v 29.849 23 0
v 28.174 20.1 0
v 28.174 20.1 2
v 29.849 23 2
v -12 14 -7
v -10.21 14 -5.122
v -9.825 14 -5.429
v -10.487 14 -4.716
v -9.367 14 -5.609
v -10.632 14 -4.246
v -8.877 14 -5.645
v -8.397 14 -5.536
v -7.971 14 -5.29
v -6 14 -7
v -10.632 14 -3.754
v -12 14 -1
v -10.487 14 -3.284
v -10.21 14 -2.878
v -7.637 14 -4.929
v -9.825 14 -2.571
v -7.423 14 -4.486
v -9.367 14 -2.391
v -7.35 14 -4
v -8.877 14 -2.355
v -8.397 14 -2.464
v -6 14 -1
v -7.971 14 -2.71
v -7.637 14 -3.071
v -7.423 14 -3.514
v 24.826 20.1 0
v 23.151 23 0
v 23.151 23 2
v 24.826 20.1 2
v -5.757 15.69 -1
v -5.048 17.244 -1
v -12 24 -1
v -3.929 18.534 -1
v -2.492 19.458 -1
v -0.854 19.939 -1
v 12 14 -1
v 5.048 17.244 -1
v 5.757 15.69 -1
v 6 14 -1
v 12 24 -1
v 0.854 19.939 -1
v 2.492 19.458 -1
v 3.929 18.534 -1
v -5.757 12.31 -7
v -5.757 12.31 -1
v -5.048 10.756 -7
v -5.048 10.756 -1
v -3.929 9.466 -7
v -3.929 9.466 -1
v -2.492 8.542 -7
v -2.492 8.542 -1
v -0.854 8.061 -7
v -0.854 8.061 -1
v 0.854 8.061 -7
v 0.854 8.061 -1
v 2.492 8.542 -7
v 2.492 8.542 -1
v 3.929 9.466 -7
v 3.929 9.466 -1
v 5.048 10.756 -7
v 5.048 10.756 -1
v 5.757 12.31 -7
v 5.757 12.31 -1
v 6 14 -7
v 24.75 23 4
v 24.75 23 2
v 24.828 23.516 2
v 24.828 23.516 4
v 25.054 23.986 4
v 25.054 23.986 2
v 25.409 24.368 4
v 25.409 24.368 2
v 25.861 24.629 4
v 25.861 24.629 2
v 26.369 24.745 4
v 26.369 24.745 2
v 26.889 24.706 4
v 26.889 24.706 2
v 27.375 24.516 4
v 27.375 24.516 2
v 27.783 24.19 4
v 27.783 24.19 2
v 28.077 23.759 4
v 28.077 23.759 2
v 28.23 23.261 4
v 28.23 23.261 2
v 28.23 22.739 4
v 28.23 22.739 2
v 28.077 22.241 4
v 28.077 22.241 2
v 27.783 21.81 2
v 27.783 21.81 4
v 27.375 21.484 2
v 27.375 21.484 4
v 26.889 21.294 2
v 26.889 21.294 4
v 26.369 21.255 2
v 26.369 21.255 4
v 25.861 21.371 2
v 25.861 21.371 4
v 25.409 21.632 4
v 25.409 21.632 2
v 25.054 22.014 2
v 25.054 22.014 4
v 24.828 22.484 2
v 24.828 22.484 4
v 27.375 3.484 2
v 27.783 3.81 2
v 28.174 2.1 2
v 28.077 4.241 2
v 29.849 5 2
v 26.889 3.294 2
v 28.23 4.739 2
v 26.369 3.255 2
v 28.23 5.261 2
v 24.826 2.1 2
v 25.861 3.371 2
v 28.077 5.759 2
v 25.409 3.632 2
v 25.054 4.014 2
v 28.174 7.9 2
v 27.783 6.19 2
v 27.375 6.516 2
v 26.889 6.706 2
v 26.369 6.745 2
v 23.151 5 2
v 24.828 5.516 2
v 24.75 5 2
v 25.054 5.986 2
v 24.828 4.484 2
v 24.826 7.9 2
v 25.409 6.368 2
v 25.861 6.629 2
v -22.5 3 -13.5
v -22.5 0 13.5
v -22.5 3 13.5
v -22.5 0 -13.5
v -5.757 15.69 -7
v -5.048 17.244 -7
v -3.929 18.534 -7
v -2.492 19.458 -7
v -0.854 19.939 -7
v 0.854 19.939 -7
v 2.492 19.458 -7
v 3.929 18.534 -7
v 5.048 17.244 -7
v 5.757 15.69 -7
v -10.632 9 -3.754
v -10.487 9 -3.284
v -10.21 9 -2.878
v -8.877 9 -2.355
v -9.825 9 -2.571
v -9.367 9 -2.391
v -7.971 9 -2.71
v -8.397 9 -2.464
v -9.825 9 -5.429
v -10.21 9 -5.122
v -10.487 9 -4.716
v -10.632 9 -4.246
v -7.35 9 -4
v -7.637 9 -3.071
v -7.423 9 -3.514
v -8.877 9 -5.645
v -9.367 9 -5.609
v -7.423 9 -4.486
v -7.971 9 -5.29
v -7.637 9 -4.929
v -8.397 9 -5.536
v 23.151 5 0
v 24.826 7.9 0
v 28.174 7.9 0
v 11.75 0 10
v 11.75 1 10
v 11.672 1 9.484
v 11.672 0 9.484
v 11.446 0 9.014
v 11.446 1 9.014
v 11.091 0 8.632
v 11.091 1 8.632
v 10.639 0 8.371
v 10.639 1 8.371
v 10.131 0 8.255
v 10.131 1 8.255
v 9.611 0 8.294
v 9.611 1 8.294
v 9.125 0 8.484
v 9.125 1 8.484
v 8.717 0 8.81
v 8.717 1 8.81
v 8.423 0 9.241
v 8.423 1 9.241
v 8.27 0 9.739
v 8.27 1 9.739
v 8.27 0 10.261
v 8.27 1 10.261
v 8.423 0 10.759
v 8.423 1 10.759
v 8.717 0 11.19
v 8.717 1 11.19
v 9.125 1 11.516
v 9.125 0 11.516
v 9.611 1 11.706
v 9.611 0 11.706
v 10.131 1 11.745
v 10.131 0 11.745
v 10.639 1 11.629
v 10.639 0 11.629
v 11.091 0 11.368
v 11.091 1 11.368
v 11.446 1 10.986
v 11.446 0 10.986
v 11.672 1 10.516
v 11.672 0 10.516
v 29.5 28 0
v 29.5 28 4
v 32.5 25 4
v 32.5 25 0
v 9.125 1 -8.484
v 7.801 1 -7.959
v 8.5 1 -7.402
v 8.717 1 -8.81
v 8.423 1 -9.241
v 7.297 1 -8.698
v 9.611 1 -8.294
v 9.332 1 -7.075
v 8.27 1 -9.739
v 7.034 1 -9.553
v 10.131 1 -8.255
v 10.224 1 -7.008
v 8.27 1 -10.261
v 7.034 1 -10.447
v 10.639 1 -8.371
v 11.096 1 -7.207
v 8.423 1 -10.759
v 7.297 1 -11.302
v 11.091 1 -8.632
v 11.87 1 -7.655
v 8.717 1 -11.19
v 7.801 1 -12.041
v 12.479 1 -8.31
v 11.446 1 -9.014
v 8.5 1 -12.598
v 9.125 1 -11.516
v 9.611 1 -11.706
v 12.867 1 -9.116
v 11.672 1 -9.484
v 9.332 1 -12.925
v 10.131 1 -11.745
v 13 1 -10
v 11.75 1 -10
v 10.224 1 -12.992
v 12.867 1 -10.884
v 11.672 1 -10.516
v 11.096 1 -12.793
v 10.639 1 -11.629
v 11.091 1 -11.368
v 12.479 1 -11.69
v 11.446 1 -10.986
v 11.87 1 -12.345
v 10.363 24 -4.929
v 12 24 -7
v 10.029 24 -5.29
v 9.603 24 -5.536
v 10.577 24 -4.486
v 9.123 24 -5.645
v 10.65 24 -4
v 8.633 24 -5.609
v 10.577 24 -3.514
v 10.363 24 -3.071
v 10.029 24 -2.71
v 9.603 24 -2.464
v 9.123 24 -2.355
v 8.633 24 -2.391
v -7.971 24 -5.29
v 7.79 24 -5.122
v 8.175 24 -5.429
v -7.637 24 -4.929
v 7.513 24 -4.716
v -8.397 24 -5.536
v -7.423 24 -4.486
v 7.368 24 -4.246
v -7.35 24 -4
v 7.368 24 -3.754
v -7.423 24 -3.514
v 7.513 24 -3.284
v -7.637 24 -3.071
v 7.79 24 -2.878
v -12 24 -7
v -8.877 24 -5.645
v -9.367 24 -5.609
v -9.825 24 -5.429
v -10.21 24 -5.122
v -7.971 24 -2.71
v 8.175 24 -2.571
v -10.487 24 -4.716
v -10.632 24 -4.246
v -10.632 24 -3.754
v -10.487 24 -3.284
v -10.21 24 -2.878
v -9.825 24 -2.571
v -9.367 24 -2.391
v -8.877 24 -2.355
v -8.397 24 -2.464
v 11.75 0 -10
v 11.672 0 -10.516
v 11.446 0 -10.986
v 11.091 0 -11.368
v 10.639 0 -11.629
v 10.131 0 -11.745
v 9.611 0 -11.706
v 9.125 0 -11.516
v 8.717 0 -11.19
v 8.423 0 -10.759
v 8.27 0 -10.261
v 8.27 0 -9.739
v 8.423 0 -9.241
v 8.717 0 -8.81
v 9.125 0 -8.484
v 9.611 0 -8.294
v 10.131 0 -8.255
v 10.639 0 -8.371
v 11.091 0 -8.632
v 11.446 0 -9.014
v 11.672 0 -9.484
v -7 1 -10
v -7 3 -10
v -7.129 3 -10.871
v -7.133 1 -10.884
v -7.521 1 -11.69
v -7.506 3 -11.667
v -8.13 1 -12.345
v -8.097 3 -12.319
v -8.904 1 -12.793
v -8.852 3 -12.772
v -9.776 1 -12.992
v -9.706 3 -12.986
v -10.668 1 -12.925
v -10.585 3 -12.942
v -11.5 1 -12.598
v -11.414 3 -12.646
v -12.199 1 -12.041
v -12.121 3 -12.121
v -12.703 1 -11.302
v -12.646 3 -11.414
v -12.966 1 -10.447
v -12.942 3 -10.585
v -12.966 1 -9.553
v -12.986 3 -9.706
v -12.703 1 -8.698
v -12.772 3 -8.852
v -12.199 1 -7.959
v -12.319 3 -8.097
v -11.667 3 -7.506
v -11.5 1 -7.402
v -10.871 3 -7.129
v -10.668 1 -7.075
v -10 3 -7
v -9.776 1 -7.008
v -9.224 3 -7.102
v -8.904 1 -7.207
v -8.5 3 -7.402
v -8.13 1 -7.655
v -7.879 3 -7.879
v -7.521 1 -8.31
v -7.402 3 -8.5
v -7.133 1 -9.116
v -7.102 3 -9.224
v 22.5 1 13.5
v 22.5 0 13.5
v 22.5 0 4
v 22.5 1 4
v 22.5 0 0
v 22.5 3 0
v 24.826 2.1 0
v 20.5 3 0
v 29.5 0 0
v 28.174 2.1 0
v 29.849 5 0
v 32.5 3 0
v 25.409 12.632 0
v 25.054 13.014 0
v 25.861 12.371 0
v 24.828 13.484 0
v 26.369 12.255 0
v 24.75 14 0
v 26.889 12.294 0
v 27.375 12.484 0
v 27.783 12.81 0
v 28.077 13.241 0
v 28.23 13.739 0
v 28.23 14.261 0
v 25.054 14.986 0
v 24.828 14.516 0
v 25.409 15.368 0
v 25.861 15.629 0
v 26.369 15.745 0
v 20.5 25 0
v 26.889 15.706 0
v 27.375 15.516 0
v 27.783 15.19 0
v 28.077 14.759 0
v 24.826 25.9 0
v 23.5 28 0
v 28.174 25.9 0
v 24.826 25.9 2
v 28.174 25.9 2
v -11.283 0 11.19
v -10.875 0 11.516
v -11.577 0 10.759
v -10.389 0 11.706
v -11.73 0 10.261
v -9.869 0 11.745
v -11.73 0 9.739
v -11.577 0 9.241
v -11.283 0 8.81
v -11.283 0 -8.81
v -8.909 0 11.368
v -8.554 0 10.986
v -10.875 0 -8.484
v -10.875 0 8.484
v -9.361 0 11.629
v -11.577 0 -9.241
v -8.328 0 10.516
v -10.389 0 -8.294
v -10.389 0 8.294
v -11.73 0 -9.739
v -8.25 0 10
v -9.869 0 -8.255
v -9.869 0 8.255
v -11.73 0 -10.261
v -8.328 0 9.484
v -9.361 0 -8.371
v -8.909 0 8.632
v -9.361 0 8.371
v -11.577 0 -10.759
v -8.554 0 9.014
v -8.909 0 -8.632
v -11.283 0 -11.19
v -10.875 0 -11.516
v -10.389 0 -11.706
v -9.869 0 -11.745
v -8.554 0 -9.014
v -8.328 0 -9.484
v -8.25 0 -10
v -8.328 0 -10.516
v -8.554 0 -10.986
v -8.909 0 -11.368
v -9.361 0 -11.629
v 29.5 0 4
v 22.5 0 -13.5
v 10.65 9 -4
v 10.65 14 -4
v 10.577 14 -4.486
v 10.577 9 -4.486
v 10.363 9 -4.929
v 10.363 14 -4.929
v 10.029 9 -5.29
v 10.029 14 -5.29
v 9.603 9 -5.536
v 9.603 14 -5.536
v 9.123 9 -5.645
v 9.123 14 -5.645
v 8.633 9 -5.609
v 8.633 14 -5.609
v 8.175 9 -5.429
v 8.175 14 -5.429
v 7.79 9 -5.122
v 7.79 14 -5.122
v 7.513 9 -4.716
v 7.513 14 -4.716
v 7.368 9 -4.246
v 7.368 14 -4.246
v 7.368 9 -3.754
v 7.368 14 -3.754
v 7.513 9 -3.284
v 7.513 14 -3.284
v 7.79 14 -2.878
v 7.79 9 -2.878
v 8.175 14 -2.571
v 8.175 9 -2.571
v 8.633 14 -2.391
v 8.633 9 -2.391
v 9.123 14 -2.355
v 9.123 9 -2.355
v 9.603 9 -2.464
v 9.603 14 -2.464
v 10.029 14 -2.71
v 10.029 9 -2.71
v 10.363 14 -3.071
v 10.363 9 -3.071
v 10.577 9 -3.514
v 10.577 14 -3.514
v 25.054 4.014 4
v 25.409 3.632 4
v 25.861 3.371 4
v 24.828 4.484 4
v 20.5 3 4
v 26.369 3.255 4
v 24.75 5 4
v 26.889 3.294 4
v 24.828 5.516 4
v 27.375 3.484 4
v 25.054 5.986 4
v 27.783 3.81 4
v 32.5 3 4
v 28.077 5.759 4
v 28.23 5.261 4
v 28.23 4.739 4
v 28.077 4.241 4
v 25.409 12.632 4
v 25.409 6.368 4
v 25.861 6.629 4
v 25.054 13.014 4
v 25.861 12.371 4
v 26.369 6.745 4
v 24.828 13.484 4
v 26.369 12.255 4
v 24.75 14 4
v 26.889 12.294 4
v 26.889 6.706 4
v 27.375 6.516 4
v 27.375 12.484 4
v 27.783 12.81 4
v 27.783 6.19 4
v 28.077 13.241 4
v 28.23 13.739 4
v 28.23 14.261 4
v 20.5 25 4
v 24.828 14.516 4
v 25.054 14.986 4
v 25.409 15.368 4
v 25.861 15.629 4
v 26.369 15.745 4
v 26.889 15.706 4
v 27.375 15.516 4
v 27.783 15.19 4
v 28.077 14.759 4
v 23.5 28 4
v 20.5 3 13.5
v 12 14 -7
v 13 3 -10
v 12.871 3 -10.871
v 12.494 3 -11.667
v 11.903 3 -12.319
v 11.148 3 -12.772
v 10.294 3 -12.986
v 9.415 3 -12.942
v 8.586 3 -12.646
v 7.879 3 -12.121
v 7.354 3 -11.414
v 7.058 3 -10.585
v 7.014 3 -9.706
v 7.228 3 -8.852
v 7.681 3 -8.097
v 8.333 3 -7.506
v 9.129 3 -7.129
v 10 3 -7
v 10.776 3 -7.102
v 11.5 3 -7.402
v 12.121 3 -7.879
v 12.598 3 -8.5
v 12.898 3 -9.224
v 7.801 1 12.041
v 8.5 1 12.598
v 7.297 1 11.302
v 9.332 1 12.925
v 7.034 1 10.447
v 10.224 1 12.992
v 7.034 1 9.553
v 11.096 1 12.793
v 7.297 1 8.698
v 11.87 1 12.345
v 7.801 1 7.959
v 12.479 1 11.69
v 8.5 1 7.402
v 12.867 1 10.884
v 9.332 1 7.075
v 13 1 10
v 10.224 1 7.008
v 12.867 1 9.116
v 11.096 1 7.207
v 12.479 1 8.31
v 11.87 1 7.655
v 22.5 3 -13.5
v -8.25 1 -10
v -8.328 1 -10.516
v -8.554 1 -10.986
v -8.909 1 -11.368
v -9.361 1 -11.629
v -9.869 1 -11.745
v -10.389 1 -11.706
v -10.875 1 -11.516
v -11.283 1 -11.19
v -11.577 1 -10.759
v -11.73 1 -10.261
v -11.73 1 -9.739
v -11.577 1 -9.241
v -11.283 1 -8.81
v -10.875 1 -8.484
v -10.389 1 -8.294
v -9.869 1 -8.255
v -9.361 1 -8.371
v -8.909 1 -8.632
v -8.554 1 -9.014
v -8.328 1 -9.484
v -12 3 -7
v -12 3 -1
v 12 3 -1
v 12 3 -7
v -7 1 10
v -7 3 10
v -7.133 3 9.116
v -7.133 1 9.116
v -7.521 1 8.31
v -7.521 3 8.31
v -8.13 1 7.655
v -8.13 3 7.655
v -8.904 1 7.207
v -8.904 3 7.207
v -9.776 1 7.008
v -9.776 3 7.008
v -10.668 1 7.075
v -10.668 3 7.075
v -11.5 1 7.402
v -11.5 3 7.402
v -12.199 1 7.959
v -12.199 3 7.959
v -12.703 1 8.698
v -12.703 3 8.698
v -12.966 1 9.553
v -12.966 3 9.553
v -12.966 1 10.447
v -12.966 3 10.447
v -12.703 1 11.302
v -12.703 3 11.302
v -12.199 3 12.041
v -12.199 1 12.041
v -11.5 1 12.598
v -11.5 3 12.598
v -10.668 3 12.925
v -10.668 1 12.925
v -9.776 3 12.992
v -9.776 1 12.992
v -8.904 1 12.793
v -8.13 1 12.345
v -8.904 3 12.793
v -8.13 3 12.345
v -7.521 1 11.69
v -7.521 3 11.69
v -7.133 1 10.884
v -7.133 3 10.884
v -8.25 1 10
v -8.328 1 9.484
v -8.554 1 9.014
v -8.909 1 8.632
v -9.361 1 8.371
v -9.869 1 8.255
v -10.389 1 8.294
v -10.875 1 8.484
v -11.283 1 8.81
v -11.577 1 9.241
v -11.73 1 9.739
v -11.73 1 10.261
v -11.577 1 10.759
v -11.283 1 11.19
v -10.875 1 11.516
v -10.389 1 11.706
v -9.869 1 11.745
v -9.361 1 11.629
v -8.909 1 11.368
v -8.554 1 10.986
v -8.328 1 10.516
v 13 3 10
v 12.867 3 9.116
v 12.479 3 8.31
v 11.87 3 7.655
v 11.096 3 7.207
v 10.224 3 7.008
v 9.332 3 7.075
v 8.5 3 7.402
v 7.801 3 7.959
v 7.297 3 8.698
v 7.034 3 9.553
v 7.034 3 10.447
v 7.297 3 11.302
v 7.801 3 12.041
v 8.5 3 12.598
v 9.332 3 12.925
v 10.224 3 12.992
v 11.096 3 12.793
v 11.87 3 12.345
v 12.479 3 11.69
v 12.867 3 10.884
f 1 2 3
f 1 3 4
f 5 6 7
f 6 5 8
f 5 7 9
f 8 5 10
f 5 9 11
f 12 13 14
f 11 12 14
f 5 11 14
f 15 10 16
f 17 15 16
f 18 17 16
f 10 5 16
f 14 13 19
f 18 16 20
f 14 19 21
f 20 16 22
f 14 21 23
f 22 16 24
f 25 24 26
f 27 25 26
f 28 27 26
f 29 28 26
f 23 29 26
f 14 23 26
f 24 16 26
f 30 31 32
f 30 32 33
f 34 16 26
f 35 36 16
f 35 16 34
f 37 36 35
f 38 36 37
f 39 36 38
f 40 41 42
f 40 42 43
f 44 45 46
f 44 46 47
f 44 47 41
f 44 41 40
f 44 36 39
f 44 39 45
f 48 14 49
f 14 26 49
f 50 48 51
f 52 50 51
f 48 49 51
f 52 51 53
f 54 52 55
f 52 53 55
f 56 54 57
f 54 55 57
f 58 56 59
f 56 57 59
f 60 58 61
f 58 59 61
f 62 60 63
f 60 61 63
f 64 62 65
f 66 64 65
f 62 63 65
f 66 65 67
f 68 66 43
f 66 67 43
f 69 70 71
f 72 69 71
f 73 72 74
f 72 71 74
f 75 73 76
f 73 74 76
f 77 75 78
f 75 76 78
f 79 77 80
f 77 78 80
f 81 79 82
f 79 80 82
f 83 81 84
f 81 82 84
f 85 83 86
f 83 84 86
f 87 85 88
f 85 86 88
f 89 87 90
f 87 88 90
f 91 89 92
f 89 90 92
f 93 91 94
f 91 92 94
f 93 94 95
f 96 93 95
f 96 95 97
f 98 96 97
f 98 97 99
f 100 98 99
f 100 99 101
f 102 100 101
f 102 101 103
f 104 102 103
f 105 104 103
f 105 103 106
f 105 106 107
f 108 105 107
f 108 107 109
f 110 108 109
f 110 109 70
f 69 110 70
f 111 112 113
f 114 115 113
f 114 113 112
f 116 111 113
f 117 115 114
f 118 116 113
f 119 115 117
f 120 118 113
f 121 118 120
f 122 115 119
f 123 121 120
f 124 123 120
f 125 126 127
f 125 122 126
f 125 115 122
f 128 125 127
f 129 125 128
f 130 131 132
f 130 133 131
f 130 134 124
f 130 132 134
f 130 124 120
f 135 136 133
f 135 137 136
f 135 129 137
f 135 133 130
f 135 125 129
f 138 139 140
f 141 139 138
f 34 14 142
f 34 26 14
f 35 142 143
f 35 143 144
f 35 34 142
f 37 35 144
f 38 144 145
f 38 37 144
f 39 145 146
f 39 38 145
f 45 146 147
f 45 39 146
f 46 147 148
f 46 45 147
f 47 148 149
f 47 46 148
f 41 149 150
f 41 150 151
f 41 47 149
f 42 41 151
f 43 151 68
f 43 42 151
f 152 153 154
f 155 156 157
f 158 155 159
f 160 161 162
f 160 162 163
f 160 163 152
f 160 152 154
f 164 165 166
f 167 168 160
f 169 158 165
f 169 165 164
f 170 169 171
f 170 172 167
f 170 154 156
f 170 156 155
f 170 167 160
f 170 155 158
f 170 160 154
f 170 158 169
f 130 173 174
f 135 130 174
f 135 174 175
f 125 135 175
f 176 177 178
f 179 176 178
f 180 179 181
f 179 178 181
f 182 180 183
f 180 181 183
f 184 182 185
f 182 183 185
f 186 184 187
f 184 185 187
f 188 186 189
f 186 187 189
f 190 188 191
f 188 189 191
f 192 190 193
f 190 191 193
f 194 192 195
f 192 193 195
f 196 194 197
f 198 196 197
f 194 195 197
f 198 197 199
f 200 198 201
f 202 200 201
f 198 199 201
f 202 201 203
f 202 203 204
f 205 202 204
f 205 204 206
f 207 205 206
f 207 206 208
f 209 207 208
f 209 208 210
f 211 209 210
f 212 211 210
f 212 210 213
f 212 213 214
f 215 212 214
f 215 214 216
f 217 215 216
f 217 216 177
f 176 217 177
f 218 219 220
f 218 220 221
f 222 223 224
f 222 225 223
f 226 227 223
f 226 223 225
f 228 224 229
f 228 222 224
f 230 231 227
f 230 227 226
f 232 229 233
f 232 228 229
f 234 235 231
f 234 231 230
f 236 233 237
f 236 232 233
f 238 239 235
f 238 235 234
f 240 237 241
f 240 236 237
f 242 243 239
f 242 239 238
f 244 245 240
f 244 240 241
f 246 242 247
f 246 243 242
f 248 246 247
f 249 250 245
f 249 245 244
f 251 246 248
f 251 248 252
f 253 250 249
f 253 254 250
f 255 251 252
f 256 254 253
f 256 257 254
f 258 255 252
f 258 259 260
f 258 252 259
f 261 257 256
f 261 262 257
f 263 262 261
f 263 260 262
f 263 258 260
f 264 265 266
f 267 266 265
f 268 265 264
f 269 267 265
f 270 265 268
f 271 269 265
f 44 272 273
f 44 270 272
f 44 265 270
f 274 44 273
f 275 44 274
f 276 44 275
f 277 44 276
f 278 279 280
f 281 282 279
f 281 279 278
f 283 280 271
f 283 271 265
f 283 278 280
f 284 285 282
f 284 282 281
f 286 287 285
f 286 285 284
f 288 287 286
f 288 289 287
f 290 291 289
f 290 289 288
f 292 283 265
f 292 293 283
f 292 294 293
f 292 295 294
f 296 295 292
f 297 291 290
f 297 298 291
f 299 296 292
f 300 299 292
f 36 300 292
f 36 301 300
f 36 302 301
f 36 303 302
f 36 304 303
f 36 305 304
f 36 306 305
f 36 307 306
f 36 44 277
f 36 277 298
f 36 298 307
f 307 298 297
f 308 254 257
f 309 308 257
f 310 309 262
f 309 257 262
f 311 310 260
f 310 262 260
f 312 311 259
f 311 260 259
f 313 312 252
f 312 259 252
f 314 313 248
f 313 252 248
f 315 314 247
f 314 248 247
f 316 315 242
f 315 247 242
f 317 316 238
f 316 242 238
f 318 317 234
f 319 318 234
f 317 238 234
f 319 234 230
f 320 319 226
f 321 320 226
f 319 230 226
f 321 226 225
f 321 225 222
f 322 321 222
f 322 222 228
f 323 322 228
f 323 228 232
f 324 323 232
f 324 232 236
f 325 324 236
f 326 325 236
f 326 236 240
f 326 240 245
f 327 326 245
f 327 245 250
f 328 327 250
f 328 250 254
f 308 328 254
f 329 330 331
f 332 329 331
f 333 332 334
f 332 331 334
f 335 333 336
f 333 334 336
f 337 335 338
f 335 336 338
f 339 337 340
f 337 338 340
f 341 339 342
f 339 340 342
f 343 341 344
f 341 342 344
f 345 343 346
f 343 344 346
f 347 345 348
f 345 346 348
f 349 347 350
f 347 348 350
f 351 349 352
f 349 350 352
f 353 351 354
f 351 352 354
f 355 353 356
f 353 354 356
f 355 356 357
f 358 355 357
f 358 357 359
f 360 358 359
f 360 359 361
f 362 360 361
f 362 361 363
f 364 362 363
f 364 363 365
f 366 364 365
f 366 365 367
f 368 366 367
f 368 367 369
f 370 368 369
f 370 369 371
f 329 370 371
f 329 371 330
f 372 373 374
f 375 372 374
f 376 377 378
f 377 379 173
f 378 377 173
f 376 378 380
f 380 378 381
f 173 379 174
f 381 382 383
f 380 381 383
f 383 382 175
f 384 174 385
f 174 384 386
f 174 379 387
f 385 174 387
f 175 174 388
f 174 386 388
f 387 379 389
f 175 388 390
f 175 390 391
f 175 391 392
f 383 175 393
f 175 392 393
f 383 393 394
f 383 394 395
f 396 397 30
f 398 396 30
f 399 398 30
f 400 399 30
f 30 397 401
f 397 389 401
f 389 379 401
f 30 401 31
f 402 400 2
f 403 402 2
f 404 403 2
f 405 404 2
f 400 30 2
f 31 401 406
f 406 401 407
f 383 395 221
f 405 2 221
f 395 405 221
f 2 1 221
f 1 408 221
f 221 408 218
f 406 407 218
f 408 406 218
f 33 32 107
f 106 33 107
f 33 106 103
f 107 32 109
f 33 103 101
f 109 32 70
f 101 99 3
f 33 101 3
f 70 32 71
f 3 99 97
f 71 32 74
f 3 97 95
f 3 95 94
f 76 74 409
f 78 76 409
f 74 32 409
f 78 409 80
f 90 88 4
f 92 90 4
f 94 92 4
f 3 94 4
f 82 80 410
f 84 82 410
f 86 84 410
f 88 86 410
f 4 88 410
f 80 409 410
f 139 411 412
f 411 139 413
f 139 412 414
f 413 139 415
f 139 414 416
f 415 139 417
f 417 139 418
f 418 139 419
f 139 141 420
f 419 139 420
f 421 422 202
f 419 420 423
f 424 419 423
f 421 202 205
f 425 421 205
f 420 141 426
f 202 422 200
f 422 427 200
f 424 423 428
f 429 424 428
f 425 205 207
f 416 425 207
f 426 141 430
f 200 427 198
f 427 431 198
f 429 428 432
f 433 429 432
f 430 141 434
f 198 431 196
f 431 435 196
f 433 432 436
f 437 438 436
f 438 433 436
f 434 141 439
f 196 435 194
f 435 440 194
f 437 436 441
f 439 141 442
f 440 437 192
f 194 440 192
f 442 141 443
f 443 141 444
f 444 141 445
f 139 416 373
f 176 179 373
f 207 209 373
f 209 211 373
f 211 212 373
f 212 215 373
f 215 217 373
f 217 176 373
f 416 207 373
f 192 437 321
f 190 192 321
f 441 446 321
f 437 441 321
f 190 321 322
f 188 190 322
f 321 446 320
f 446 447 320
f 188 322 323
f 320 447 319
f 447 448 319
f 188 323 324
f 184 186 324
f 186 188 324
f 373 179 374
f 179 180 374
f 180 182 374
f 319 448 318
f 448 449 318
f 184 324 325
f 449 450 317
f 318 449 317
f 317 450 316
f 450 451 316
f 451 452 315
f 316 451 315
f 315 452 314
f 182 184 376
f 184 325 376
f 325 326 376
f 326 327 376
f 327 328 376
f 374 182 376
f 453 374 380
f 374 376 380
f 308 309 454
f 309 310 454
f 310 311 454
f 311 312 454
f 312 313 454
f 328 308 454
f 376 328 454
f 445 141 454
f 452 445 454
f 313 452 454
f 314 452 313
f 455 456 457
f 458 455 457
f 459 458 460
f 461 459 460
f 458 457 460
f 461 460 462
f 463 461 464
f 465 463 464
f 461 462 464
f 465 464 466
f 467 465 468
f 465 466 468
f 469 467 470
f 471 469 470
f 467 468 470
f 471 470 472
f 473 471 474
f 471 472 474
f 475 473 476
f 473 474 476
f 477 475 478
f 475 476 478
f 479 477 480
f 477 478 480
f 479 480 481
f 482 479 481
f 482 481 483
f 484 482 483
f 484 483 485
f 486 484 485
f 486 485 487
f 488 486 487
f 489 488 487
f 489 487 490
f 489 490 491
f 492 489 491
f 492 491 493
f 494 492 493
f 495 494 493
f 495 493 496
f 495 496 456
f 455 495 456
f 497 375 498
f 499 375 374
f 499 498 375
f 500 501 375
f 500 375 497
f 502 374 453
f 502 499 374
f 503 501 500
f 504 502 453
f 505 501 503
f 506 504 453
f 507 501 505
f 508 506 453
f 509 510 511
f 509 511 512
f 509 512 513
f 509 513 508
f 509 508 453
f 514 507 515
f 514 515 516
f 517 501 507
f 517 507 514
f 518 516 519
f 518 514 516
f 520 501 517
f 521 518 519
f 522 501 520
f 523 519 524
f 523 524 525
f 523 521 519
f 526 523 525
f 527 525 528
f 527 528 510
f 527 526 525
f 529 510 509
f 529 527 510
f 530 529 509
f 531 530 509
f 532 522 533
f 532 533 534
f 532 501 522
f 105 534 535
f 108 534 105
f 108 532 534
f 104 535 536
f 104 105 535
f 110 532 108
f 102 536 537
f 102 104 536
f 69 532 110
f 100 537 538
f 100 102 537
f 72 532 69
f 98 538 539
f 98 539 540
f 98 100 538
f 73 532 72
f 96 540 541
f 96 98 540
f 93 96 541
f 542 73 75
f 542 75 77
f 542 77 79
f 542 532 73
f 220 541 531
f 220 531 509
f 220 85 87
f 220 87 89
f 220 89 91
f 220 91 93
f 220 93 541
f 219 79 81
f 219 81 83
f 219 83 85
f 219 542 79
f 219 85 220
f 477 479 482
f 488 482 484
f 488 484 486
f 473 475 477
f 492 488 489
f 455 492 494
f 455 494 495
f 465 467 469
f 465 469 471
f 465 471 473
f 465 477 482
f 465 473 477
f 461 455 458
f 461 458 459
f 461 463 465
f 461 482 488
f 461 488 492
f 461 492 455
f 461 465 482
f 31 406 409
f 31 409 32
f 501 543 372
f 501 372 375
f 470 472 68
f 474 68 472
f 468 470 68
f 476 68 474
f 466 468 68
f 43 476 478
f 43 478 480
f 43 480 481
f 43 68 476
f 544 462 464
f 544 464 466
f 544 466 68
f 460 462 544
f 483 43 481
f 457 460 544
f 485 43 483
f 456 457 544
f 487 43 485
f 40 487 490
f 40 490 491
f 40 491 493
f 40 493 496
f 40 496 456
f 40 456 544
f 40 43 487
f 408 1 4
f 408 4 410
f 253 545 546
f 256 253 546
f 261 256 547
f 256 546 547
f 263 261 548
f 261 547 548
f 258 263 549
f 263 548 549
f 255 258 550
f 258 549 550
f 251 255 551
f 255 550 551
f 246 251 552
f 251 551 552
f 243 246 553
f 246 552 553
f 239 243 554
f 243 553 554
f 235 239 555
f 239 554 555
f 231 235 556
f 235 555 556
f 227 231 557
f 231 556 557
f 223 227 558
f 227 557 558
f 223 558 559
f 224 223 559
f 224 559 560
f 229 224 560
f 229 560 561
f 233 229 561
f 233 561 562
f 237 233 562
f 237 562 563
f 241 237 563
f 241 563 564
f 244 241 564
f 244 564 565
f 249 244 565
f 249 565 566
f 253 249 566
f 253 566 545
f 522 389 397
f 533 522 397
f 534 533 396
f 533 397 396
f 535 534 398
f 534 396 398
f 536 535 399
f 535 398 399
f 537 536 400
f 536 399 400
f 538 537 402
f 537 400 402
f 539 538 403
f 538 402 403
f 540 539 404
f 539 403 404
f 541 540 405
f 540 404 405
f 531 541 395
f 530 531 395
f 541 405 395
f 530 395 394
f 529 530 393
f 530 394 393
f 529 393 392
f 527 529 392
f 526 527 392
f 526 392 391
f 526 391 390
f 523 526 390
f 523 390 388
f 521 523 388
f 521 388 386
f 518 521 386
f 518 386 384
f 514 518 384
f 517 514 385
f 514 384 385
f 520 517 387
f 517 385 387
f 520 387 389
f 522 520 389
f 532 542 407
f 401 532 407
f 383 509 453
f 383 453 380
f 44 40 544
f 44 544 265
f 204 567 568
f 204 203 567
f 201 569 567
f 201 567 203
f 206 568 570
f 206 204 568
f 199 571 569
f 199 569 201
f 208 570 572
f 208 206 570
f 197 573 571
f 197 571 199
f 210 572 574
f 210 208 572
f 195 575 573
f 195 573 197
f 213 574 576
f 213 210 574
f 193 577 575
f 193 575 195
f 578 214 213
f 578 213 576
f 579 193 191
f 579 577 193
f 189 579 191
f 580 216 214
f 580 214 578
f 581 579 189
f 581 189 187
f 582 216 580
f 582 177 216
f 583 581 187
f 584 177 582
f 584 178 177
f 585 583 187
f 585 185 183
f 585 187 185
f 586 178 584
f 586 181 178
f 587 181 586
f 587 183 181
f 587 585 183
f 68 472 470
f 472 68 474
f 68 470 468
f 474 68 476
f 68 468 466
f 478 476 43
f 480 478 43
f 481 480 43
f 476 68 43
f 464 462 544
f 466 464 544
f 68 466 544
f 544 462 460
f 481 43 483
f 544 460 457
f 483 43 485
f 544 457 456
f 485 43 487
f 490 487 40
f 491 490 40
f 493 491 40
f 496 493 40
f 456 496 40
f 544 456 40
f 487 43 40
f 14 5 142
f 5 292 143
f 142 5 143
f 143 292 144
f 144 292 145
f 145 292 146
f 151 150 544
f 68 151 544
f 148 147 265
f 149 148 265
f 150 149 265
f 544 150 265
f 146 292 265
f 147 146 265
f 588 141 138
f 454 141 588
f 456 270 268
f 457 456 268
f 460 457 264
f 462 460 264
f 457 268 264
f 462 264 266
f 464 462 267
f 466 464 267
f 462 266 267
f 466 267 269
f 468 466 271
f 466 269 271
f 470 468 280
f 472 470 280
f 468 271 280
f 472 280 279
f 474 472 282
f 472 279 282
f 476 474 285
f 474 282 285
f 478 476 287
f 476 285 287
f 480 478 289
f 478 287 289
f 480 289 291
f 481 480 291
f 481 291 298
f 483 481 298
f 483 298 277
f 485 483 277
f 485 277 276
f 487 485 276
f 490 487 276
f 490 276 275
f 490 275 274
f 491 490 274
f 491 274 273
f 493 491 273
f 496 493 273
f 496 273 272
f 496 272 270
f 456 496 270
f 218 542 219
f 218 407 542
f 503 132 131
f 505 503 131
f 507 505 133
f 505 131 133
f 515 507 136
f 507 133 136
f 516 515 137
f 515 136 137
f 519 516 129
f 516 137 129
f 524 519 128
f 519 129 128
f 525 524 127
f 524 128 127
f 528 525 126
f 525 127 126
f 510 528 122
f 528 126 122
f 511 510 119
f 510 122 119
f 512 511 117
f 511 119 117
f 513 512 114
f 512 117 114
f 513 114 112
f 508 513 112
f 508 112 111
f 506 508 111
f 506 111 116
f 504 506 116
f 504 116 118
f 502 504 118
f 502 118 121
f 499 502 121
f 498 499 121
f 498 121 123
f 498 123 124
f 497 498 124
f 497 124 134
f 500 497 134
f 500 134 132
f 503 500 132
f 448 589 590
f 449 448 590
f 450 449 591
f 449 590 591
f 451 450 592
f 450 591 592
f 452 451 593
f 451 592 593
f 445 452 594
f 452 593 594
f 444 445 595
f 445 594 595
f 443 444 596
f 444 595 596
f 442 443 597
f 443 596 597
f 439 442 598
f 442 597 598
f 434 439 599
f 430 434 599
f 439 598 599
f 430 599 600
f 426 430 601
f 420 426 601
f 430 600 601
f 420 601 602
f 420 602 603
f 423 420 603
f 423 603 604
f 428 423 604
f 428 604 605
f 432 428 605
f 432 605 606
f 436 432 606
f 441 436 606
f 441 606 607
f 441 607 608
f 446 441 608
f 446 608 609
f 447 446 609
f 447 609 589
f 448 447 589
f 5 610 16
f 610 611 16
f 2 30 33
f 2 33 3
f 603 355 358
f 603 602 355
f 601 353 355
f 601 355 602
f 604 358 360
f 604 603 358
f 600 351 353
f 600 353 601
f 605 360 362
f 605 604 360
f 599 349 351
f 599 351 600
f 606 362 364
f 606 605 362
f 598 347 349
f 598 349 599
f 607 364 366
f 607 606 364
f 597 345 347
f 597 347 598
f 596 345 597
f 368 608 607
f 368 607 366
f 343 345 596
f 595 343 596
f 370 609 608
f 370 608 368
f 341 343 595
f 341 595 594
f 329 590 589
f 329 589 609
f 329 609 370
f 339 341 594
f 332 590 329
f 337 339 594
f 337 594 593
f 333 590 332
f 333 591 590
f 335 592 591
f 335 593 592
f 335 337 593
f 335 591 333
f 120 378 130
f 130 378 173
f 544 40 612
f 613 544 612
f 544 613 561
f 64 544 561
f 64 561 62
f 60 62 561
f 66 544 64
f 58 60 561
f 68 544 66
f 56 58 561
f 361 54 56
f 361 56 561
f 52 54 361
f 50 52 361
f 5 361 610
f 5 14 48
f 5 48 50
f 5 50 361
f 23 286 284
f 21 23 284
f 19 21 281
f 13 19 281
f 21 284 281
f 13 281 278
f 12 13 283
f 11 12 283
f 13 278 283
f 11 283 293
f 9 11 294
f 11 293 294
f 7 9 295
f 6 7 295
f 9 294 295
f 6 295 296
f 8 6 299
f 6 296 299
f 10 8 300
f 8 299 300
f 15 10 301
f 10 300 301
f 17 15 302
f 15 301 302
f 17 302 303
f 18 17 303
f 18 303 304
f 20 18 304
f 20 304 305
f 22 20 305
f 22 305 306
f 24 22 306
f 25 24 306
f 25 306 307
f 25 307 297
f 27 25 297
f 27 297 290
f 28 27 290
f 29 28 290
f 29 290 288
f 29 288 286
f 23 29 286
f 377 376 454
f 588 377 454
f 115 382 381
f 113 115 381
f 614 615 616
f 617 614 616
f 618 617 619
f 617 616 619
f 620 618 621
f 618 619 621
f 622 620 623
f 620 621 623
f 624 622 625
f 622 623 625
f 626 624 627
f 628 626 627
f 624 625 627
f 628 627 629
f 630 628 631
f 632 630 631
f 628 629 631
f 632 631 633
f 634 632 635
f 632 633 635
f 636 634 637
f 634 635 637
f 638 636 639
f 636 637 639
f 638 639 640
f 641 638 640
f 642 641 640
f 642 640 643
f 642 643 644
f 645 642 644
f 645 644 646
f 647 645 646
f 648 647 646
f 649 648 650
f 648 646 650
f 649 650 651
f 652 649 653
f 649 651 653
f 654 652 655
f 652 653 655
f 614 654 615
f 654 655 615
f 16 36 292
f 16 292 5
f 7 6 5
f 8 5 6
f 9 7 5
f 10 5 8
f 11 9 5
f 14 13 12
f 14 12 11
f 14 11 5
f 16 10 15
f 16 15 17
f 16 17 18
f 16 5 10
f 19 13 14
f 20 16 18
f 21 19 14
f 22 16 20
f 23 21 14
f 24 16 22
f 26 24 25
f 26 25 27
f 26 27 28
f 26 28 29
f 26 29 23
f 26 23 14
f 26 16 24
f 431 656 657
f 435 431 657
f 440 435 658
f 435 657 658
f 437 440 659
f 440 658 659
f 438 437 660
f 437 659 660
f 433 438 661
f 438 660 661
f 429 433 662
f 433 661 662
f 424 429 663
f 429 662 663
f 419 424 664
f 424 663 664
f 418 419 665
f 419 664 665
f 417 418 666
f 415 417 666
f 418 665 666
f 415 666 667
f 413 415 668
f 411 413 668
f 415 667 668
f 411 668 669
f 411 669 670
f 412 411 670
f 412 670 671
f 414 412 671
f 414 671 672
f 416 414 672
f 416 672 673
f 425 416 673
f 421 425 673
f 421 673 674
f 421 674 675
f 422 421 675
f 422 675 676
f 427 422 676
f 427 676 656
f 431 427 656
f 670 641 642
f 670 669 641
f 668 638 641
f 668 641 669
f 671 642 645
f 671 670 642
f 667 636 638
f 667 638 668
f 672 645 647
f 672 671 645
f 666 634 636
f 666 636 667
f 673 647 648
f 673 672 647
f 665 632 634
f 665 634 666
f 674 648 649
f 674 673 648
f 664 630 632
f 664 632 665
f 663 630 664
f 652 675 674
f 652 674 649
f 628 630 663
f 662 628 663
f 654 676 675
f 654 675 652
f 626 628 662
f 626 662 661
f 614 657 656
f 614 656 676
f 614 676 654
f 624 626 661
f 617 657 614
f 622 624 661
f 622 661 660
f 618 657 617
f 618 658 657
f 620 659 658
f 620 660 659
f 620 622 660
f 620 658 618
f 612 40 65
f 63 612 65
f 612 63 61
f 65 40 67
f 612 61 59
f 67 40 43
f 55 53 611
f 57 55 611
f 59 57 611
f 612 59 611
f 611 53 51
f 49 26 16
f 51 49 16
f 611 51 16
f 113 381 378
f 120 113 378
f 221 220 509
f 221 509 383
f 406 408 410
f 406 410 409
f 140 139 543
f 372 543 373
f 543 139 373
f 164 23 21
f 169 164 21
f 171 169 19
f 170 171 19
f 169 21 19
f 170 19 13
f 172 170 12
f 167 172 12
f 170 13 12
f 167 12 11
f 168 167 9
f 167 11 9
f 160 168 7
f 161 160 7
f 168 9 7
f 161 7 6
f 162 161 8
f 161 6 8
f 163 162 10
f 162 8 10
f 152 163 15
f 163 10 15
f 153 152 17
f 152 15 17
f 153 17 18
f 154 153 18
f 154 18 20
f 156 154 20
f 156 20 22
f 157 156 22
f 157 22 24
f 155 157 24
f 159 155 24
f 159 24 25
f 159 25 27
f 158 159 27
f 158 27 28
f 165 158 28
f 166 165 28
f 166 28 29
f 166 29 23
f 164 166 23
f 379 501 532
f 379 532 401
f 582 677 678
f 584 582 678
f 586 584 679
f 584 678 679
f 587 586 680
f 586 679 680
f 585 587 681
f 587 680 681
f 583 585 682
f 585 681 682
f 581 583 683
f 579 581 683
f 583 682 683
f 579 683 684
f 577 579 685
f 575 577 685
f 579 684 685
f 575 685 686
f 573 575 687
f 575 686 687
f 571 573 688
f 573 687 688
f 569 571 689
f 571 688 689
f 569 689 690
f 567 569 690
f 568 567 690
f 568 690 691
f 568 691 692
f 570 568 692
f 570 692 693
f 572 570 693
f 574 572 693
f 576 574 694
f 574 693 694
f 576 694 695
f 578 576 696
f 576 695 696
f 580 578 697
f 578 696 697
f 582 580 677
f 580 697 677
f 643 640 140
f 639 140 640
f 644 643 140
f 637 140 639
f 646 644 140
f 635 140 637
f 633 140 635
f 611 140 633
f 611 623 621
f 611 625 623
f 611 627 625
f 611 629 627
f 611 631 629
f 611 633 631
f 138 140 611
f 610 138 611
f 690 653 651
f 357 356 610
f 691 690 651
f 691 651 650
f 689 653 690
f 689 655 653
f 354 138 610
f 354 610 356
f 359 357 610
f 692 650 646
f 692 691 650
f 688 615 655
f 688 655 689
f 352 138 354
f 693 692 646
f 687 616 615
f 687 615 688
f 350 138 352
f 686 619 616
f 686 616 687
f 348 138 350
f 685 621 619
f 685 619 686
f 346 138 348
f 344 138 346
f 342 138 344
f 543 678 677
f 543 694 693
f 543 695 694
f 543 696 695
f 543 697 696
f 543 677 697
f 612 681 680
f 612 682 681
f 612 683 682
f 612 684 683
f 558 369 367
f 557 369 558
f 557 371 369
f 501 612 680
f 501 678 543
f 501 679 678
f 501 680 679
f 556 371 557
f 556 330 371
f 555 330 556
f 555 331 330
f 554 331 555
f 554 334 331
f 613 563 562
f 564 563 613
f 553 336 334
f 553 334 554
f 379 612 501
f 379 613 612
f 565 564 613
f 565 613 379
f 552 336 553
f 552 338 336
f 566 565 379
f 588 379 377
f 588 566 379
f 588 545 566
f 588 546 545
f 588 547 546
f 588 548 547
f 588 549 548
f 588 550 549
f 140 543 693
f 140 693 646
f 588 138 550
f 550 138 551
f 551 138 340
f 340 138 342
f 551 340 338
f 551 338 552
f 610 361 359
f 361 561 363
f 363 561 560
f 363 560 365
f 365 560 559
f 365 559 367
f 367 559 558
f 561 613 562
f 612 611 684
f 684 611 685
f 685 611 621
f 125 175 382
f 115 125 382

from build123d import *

# Parameters (mm, degrees)
SKETCH1_W                = 45
SKETCH1_H                = 27
BOSS_EXTRUDE1_DEPTH      = 3
CUT_EXTRUDE1_REACH       = 5
SKETCH2_R                = 1.75
SKETCH3_R                = 3
CUT_EXTRUDE2_DEPTH       = 2
BOSS_EXTRUDE2_DEPTH      = 3
BOSS_EXTRUDE3_DEPTH      = 3
SKETCH7_R                = 1.65
CUT_EXTRUDE3_DEPTH       = 15
SKETCH8_W                = 12
SKETCH8_H                = 4
BOSS_EXTRUDE4_DEPTH      = 25
BOSS_EXTRUDE4_DEPTH_BACK = 3
SKETCH9_R                = 1.75
CUT_EXTRUDE4_DEPTH       = 4
CUT_EXTRUDE5_DEPTH       = 2
CHAMFER1_SIZE            = 2
CHAMFER2_SIZE            = 3


with BuildPart() as part:
    # Sketch1 → Boss-Extrude1 (new body)
    with BuildSketch(Plane(origin=(0, 0, 0), x_dir=(1, 0, 0), z_dir=(0, 1, 0))):
        Rectangle(SKETCH1_W, SKETCH1_H)
    extrude(amount=BOSS_EXTRUDE1_DEPTH)

    # Sketch2 → Cut-Extrude1 (cut, up to next)
    with BuildSketch(Plane(origin=(0, 3, 0), x_dir=(1, 0, 0), z_dir=(0, 1, 0)), mode=Mode.PRIVATE) as cut_extrude1_sk1:
        with Locations((-10, 10)):
            Circle(SKETCH2_R)
    cut_extrude1_tool1 = extrude(cut_extrude1_sk1.sketch, amount=-CUT_EXTRUDE1_REACH, mode=Mode.PRIVATE) & part.part
    add(cut_extrude1_tool1.solids().sort_by_distance((-10, 3, -10))[0], mode=Mode.SUBTRACT)
    # Sketch2 → Cut-Extrude1 (cut, up to next)
    with BuildSketch(Plane(origin=(0, 3, 0), x_dir=(1, 0, 0), z_dir=(0, 1, 0)), mode=Mode.PRIVATE) as cut_extrude1_sk2:
        with Locations((10, 10)):
            Circle(SKETCH2_R)
    cut_extrude1_tool2 = extrude(cut_extrude1_sk2.sketch, amount=-CUT_EXTRUDE1_REACH, mode=Mode.PRIVATE) & part.part
    add(cut_extrude1_tool2.solids().sort_by_distance((10, 3, -10))[0], mode=Mode.SUBTRACT)
    # Sketch2 → Cut-Extrude1 (cut, up to next)
    with BuildSketch(Plane(origin=(0, 3, 0), x_dir=(1, 0, 0), z_dir=(0, 1, 0)), mode=Mode.PRIVATE) as cut_extrude1_sk3:
        with Locations((10, -10)):
            Circle(SKETCH2_R)
    cut_extrude1_tool3 = extrude(cut_extrude1_sk3.sketch, amount=-CUT_EXTRUDE1_REACH, mode=Mode.PRIVATE) & part.part
    add(cut_extrude1_tool3.solids().sort_by_distance((10, 3, 10))[0], mode=Mode.SUBTRACT)
    # Sketch2 → Cut-Extrude1 (cut, up to next)
    with BuildSketch(Plane(origin=(0, 3, 0), x_dir=(1, 0, 0), z_dir=(0, 1, 0)), mode=Mode.PRIVATE) as cut_extrude1_sk4:
        with Locations((-10, -10)):
            Circle(SKETCH2_R)
    cut_extrude1_tool4 = extrude(cut_extrude1_sk4.sketch, amount=-CUT_EXTRUDE1_REACH, mode=Mode.PRIVATE) & part.part
    add(cut_extrude1_tool4.solids().sort_by_distance((-10, 3, 10))[0], mode=Mode.SUBTRACT)

    # Sketch3 → Cut-Extrude2 (cut)
    with BuildSketch(Plane(origin=(0, 3, 0), x_dir=(1, 0, 0), z_dir=(0, 1, 0))):
        with Locations((-10, 10)):
            Circle(SKETCH3_R)
        with Locations((10, 10)):
            Circle(SKETCH3_R)
        with Locations((10, -10)):
            Circle(SKETCH3_R)
        with Locations((-10, -10)):
            Circle(SKETCH3_R)
    extrude(amount=-CUT_EXTRUDE2_DEPTH, mode=Mode.SUBTRACT)

    # Sketch5 → Boss-Extrude2 (add, symmetric)
    with BuildSketch(Plane.XY.offset(-4)):
        with BuildLine():
            Line((12, 3), (-12, 3))
            Line((-12, 3), (-12, 14))
            Line((-12, 14), (-6, 14))
            ThreePointArc((-6, 14), (0, 8), (6, 14))
            Line((6, 14), (12, 14))
            Line((12, 14), (12, 3))
        make_face()
    extrude(amount=BOSS_EXTRUDE2_DEPTH, both=True)


with BuildPart() as body_2:
    # Sketch6 → Boss-Extrude3 (new body, symmetric)
    with BuildSketch(Plane.XY.offset(-4)):
        with BuildLine():
            Line((6, 14), (12, 14))
            Line((12, 14), (12, 24))
            Line((12, 24), (-12, 24))
            Line((-12, 24), (-12, 14))
            Line((-12, 14), (-6, 14))
            ThreePointArc((-6, 14), (0, 20), (6, 14))
        make_face()
    extrude(amount=BOSS_EXTRUDE3_DEPTH, both=True)


with BuildPart() as cut_extrude3_tool:
    # Sketch7 → Cut-Extrude3 (new body)
    with BuildSketch(Plane(origin=(0, 24, 0), x_dir=(1, 0, 0), z_dir=(0, 1, 0))):
        with Locations((-9, 4)):
            Circle(SKETCH7_R)
        with Locations((9, 4)):
            Circle(SKETCH7_R)
    extrude(amount=-CUT_EXTRUDE3_DEPTH)


with BuildPart() as part_1:
    add(part.part)

    # Cut-Extrude3: cut by cut_extrude3_tool
    add(cut_extrude3_tool.part, mode=Mode.SUBTRACT)

    # Sketch8 → Boss-Extrude4 (add, two sides)
    with BuildSketch(Plane(origin=(0, 3, 0), x_dir=(1, 0, 0), z_dir=(0, 1, 0))) as boss_extrude4_sk:
        with Locations((26.5, -2)):
            Rectangle(SKETCH8_W, SKETCH8_H)
    extrude(amount=BOSS_EXTRUDE4_DEPTH)
    extrude(boss_extrude4_sk.sketch, amount=-BOSS_EXTRUDE4_DEPTH_BACK)

    # Sketch9 → Cut-Extrude4 (cut)
    with BuildSketch(Plane(origin=(0, 0, 0), x_dir=(-1, 0, 0), z_dir=(0, 0, -1))):
        with Locations((-26.5, 5)):
            Circle(SKETCH9_R)
        with Locations((-26.5, 14)):
            Circle(SKETCH9_R)
        with Locations((-26.5, 23)):
            Circle(SKETCH9_R)
    extrude(amount=-CUT_EXTRUDE4_DEPTH, mode=Mode.SUBTRACT)

    # Sketch10 → Cut-Extrude5 (cut)
    with BuildSketch(Plane(origin=(0, 0, 0), x_dir=(-1, 0, 0), z_dir=(0, 0, -1))):
        Polygon((-29.848631561, 5), (-28.174315781, 2.1), (-24.825684219, 2.1), (-23.151368439, 5), (-24.825684219, 7.9), (-28.174315781, 7.9), align=None)
        Polygon((-28.174315781, 20.1), (-29.848631561, 23), (-28.174315781, 25.9), (-24.825684219, 25.9), (-23.151368439, 23), (-24.825684219, 20.1), align=None)
    extrude(amount=-CUT_EXTRUDE5_DEPTH, mode=Mode.SUBTRACT)

    # Chamfer1
    chamfer1_edges = [part_1.edges().sort_by_distance(p)[0] for p in [
        (22.5, 3, 8.75),
    ]]
    chamfer(chamfer1_edges, length=CHAMFER1_SIZE)

    # Chamfer2
    chamfer2_edges = [part_1.edges().sort_by_distance(p)[0] for p in [
        (32.5, 0, 2),
        (20.5, 28, 2),
        (32.5, 28, 2),
    ]]
    chamfer(chamfer2_edges, length=CHAMFER2_SIZE)


with BuildPart() as body_2_1:
    add(body_2.part)

    # Cut-Extrude3: cut by cut_extrude3_tool
    add(cut_extrude3_tool.part, mode=Mode.SUBTRACT)


solid = Compound([part_1.part, body_2_1.part])
